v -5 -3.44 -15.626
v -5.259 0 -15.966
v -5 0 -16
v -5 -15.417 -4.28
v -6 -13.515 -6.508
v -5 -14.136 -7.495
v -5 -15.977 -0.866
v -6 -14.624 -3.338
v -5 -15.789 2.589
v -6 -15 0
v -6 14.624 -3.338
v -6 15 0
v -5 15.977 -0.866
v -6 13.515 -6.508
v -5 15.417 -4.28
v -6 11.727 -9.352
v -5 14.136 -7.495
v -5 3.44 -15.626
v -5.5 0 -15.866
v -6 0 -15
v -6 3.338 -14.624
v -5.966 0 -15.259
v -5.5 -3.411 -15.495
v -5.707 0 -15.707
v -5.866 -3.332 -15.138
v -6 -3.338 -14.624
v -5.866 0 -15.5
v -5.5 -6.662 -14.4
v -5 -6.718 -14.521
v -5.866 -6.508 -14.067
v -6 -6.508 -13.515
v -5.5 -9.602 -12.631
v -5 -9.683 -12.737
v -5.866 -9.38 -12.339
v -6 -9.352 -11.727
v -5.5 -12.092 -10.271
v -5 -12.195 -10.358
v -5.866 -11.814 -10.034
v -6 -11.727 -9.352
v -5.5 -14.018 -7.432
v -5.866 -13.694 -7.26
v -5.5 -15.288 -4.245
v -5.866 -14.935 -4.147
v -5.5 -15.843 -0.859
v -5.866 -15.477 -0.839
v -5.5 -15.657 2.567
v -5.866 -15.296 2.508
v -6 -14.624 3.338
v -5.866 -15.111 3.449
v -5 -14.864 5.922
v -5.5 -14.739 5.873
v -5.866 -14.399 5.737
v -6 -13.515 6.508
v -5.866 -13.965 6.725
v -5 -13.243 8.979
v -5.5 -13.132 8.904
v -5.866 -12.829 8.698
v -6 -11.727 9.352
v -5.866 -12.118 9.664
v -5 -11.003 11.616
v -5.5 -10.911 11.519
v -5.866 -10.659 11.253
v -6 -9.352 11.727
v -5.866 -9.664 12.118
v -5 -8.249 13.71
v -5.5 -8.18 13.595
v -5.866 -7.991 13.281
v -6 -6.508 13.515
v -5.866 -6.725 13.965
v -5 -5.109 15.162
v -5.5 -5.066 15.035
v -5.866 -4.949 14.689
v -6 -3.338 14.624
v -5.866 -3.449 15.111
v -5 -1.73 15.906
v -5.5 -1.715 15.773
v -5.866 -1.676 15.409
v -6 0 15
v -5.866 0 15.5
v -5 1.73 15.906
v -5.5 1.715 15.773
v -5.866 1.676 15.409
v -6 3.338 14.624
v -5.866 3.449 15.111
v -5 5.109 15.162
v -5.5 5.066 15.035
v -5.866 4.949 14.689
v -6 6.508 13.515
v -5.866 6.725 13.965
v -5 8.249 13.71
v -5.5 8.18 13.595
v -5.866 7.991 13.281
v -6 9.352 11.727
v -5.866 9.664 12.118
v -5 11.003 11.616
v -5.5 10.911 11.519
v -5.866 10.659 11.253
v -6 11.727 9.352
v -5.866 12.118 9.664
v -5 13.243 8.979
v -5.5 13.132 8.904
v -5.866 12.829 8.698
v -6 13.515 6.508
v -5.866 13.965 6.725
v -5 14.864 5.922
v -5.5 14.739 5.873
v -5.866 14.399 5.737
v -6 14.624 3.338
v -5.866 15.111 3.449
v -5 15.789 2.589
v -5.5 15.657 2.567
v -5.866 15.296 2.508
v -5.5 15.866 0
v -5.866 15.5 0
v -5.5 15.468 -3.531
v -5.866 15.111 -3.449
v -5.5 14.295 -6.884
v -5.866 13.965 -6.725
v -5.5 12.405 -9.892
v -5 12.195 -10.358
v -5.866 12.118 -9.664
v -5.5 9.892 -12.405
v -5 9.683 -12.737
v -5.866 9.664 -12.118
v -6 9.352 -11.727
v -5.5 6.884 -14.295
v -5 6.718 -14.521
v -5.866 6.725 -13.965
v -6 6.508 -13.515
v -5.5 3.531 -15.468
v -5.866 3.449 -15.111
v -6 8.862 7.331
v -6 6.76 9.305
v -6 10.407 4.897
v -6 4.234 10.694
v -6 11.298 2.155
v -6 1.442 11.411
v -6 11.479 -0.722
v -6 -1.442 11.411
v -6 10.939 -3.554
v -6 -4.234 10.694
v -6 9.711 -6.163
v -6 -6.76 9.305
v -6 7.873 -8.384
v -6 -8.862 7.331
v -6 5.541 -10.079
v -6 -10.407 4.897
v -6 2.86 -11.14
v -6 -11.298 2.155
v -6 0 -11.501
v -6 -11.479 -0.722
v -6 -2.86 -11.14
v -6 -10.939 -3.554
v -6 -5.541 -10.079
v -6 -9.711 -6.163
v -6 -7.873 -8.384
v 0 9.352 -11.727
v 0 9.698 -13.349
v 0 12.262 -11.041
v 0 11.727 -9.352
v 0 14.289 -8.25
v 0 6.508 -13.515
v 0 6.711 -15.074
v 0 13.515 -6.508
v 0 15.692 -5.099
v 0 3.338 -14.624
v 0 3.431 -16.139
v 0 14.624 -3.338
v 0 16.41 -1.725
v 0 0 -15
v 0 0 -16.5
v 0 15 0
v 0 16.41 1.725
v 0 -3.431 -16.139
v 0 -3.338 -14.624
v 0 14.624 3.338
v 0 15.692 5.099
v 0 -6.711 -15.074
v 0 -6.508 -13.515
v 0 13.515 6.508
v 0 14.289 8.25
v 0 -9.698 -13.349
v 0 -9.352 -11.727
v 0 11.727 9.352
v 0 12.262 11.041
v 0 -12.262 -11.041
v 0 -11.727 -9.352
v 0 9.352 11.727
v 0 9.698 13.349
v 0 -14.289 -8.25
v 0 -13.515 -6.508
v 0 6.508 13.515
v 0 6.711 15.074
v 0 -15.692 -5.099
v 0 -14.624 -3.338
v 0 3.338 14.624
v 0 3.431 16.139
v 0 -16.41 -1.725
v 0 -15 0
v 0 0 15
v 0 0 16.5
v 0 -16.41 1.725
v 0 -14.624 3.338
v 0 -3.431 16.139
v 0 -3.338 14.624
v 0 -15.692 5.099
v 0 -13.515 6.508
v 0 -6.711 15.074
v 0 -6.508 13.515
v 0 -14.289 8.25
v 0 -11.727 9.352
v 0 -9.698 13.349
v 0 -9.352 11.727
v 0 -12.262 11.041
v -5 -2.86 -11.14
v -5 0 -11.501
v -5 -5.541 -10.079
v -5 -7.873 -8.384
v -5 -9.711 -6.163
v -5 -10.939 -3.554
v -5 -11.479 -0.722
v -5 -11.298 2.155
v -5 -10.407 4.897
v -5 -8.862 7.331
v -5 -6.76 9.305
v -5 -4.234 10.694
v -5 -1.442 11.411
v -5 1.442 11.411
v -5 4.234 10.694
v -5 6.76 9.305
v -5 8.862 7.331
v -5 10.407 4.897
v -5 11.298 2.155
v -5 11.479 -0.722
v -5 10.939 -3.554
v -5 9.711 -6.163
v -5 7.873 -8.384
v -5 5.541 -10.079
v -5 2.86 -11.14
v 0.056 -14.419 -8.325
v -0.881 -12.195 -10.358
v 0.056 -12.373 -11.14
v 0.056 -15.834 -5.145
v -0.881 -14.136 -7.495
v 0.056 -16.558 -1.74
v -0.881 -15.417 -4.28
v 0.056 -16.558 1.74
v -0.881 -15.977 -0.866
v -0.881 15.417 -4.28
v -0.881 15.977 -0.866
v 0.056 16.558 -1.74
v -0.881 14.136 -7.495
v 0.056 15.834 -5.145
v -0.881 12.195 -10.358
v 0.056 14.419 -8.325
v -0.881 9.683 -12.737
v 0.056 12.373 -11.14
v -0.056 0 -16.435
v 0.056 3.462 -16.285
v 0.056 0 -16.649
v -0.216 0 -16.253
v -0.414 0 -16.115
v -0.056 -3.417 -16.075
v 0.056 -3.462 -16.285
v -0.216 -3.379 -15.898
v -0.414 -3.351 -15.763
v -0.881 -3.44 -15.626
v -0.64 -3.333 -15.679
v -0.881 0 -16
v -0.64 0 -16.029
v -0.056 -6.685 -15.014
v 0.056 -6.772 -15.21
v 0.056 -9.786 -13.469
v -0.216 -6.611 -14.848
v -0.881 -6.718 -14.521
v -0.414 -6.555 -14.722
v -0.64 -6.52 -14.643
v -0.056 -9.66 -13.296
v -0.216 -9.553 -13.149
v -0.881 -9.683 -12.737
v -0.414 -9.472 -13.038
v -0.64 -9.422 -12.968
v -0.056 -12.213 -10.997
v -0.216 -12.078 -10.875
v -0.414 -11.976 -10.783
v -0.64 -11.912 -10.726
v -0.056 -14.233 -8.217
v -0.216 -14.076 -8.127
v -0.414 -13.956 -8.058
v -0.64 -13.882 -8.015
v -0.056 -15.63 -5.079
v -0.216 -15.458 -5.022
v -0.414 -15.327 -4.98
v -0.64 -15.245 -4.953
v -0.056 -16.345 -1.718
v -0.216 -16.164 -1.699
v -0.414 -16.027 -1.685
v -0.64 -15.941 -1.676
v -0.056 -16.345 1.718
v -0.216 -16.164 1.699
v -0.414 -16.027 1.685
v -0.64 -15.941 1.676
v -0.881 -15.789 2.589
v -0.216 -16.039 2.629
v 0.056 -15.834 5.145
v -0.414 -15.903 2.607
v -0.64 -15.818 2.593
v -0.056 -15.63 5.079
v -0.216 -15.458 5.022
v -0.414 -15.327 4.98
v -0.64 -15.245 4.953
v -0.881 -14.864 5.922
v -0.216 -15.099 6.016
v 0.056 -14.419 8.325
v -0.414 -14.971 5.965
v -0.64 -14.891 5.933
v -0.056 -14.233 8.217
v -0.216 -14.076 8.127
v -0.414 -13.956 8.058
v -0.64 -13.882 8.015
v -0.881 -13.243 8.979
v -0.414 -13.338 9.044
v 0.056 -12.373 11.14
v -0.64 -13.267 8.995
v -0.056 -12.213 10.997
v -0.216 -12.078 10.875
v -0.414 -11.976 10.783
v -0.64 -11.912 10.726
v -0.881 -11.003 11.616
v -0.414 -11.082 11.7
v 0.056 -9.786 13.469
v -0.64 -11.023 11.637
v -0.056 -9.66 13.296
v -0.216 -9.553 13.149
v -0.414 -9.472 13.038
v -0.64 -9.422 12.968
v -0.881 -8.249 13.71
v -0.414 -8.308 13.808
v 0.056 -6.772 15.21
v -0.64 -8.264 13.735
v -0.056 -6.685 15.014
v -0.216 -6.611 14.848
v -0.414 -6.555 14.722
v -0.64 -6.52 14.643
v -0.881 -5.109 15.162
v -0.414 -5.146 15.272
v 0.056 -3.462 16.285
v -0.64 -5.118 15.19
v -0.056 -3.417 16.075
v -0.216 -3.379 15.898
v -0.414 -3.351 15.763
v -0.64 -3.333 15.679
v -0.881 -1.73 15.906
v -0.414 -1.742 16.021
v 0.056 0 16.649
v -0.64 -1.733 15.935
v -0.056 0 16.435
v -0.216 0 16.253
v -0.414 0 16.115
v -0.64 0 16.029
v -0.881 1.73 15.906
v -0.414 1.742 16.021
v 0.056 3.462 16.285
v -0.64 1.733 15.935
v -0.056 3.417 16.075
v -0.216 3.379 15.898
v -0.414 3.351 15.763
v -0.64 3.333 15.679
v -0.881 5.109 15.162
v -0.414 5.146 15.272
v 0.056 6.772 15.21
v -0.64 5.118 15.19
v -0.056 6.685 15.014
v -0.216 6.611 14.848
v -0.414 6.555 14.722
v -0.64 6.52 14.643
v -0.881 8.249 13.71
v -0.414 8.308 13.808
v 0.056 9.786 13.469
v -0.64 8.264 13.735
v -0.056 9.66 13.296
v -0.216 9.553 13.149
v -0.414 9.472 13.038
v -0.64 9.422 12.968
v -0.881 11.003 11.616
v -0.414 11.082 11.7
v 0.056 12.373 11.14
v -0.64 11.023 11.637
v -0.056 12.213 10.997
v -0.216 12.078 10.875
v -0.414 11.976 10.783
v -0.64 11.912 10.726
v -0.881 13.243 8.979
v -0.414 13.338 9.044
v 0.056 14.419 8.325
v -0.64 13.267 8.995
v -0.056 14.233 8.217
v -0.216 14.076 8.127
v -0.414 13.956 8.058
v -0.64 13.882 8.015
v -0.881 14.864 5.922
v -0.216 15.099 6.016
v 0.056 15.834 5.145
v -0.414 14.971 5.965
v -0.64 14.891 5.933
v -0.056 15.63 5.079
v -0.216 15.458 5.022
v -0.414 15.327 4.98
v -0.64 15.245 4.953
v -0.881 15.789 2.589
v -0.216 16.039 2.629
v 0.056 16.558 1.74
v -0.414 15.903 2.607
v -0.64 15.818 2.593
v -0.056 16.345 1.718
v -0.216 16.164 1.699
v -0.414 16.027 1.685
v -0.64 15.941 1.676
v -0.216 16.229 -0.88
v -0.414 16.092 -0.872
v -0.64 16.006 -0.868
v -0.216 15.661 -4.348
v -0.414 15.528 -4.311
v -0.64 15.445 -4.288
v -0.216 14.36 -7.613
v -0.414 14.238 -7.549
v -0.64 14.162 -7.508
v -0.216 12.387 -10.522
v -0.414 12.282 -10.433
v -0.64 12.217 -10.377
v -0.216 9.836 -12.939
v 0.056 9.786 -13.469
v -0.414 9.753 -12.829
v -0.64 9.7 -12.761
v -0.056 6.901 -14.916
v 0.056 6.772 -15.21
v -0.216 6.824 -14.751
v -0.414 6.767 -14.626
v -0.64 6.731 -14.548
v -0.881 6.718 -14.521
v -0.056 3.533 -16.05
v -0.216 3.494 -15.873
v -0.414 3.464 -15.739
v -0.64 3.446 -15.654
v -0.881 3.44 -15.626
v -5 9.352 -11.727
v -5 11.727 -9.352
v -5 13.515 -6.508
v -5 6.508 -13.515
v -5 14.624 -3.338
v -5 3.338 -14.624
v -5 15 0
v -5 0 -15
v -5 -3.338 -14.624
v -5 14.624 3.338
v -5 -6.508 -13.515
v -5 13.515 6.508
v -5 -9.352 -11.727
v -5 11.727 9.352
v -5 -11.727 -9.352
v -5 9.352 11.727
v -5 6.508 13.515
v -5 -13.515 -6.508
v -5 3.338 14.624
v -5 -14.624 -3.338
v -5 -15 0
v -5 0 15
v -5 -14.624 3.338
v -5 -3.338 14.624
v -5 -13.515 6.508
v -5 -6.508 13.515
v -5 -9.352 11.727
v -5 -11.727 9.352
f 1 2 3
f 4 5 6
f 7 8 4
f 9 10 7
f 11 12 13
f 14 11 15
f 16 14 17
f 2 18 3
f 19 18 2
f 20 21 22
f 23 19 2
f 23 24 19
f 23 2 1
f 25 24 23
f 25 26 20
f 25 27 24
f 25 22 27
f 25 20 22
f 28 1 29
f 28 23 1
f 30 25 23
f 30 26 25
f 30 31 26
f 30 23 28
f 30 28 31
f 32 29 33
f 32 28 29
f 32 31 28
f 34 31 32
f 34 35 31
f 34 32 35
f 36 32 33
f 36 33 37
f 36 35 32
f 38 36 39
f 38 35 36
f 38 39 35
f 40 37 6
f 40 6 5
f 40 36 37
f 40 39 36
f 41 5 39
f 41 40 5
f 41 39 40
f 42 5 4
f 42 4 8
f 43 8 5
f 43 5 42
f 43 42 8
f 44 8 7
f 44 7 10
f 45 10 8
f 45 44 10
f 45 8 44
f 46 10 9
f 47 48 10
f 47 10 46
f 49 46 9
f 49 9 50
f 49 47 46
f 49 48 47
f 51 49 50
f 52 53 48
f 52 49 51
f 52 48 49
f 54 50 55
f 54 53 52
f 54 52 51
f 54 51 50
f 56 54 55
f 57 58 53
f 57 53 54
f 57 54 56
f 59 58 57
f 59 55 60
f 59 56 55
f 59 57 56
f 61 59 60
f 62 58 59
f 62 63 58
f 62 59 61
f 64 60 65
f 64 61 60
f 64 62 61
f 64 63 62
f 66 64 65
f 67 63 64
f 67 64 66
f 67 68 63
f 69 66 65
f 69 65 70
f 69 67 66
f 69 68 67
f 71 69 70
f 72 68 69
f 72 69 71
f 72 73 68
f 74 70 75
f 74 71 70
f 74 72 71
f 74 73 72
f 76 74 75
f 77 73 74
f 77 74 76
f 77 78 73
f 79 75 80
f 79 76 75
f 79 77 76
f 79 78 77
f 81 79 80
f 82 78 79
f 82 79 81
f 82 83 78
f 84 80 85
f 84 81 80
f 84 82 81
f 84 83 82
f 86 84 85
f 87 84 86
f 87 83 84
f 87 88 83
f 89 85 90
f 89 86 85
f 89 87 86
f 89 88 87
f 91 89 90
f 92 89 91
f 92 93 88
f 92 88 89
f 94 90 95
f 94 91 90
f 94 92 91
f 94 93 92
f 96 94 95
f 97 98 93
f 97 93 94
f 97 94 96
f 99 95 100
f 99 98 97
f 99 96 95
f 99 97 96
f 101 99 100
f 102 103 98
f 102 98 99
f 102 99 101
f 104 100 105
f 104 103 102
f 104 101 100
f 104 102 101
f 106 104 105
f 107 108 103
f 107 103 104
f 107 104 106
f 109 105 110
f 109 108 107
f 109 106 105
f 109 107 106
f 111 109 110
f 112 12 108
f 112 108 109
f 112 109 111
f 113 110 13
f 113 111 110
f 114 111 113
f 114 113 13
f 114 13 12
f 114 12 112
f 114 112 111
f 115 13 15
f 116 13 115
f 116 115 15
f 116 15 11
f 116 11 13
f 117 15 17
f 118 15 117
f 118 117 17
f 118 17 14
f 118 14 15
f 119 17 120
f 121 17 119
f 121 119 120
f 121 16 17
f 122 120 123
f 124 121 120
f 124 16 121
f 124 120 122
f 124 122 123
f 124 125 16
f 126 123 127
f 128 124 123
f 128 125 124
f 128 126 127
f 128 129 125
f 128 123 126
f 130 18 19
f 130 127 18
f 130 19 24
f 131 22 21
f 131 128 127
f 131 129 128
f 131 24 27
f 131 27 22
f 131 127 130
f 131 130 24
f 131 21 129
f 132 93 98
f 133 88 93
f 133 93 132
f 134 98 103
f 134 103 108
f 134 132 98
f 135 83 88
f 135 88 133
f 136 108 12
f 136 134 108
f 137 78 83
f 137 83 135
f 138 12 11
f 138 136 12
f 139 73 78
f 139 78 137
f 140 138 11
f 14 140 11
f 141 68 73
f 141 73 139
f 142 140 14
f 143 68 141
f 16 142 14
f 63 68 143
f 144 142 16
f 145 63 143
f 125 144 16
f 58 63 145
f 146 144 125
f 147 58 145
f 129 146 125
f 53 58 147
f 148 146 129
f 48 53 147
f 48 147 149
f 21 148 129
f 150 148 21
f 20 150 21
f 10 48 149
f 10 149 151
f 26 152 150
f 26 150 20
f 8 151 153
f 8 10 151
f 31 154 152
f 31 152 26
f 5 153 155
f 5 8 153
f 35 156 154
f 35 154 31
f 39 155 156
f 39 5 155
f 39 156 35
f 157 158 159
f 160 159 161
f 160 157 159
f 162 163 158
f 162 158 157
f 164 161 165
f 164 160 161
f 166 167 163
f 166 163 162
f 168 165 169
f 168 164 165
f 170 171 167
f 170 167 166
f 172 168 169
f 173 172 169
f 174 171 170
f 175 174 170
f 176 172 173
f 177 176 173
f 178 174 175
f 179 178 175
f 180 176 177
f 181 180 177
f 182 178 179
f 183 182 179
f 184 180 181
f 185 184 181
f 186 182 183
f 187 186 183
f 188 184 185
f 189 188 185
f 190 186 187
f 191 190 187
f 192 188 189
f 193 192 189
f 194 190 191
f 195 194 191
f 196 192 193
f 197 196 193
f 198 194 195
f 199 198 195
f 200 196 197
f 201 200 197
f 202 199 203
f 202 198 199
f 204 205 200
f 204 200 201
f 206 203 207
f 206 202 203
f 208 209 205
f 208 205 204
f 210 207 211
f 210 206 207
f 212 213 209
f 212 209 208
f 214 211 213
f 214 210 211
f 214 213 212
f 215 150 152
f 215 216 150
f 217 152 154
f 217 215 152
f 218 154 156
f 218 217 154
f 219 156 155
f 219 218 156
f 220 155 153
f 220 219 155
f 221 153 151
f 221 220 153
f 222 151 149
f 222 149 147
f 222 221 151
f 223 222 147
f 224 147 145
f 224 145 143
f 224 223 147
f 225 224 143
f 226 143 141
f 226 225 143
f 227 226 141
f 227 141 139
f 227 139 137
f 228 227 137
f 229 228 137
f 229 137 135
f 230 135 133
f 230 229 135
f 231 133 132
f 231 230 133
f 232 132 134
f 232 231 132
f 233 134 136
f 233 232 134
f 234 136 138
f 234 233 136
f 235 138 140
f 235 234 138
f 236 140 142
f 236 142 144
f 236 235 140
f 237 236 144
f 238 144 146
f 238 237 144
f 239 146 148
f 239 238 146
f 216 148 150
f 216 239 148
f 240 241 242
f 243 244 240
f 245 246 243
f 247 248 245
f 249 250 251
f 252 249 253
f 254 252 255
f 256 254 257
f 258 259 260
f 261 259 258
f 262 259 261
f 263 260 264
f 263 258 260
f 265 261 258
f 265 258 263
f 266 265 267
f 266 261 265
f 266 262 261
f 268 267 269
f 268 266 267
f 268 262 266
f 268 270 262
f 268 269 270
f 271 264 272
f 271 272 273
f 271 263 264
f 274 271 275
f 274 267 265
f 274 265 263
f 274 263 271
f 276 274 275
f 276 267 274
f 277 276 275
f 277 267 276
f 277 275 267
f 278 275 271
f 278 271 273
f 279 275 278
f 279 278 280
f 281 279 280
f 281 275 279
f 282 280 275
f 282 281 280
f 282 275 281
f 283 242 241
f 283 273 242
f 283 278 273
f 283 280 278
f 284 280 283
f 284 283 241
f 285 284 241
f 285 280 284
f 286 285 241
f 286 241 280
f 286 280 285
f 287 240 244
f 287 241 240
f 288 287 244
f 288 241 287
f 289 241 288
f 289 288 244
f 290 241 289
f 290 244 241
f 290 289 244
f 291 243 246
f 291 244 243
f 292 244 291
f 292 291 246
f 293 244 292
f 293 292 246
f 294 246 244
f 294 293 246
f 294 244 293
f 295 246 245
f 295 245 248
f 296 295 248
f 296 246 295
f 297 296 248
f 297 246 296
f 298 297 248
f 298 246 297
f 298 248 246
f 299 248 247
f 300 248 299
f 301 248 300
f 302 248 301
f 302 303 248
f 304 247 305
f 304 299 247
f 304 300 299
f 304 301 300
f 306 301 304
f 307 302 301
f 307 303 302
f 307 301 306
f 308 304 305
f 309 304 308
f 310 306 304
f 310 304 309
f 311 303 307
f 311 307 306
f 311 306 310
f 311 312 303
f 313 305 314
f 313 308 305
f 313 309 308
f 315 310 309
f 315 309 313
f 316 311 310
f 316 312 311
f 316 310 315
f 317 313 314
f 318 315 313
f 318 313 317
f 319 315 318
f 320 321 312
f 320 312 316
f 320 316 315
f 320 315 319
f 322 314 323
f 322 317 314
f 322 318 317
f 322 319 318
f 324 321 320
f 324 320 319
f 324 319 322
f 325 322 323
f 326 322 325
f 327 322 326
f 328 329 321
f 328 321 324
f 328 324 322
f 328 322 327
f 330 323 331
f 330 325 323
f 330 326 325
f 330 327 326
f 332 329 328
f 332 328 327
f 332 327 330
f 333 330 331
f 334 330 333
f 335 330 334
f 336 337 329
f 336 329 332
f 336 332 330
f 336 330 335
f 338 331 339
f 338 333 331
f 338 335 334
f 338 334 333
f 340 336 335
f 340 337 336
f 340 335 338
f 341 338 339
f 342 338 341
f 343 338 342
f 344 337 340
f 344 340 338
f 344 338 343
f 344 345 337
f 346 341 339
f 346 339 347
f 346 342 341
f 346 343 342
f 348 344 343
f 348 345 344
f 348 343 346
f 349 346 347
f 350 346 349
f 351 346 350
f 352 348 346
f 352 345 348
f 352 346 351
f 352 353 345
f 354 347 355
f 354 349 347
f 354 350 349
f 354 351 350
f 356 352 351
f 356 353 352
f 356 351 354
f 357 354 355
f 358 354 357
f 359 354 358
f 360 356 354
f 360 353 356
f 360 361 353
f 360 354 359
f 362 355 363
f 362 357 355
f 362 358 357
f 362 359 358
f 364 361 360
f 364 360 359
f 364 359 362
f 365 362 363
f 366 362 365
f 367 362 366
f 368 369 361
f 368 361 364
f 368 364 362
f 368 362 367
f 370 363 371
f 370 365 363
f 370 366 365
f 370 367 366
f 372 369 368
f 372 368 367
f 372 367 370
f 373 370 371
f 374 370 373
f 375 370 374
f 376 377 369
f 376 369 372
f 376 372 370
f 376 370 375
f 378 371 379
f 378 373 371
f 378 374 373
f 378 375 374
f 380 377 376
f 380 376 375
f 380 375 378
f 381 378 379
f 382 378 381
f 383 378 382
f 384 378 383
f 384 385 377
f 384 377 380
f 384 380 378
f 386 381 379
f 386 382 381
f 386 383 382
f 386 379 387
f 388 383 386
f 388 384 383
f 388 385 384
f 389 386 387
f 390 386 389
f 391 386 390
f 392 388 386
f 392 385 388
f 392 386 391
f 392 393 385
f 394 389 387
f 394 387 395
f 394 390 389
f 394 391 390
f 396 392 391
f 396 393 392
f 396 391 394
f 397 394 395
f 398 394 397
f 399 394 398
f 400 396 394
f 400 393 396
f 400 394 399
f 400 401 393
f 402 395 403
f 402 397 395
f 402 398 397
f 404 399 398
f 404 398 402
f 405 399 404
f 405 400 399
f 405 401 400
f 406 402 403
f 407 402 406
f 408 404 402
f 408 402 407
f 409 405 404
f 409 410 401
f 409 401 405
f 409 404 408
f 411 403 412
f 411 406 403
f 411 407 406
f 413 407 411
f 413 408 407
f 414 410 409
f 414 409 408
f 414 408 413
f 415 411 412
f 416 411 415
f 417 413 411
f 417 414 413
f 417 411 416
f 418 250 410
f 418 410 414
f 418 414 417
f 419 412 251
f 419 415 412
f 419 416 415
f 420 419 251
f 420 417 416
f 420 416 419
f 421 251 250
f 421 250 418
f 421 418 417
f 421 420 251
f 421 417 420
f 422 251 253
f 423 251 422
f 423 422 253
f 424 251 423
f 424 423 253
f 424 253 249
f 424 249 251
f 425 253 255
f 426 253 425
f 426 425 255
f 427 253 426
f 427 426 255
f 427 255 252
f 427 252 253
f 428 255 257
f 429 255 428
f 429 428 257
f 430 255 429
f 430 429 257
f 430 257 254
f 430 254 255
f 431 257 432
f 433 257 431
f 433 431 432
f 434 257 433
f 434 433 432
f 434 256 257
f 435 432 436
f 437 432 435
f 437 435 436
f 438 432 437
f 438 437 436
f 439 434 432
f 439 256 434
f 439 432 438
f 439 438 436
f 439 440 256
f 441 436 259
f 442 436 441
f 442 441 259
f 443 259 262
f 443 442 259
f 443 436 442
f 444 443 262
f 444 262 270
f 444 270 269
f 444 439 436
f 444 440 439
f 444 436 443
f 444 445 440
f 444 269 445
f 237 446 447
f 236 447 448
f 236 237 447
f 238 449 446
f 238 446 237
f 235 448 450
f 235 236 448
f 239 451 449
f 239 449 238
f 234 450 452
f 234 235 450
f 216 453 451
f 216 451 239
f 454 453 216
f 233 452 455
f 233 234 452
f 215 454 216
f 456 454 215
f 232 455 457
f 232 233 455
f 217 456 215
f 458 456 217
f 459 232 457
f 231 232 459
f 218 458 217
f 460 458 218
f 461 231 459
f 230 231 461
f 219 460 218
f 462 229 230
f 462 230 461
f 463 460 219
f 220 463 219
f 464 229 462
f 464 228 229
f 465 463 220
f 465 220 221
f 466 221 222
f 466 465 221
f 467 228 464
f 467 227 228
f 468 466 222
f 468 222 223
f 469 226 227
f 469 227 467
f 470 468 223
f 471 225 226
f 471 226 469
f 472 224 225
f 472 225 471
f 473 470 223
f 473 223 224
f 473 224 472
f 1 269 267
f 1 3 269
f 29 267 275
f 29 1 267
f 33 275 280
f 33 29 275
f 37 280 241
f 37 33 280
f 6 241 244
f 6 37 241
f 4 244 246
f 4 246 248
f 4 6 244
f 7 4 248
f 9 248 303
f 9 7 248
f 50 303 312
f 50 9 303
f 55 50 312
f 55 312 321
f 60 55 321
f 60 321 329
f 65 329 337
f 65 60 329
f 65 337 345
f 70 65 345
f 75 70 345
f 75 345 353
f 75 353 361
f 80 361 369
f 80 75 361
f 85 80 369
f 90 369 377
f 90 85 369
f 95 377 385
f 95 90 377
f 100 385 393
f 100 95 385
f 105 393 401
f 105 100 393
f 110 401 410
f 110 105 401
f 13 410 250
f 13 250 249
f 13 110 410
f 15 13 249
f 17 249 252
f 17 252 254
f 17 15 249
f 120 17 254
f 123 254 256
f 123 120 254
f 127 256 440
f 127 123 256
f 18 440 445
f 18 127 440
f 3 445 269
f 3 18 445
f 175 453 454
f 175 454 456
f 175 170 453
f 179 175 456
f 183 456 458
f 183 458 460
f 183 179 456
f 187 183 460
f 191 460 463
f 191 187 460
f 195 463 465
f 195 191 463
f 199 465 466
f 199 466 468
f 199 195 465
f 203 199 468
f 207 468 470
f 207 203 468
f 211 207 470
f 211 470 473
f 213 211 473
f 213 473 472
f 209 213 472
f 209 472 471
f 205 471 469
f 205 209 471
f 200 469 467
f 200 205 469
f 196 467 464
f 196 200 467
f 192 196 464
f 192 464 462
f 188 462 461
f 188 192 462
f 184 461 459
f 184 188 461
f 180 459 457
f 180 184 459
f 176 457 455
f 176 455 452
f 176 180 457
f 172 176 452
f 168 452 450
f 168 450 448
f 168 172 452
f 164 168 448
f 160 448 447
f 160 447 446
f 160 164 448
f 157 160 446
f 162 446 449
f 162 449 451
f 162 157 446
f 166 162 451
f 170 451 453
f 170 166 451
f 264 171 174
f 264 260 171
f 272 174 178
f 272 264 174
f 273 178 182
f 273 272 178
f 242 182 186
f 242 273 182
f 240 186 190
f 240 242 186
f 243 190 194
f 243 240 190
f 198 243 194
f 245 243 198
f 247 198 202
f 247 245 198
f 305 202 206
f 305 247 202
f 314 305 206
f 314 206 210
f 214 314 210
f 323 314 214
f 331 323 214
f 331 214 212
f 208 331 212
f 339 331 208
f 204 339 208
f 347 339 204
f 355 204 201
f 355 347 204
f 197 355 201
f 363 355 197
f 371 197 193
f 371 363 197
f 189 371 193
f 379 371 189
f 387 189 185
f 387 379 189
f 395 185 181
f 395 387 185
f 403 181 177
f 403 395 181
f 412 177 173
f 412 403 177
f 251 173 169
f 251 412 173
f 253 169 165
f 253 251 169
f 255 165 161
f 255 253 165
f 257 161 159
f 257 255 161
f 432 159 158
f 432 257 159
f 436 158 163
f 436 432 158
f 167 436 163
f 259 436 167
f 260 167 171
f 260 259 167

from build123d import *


with BuildPart() as part:
    # Croquis1 → Revolución1 (revolve)
    with BuildSketch(Plane(origin=(0, 0, 0), x_dir=(1, 0, 0), z_dir=(0, 1, 0))):
        with BuildLine():
            Line((-0.88053939, 16), (-5, 16))
            ThreePointArc((-5, 16), (-5.707106781, 15.707106781), (-6, 15))
            Line((-6, 15), (-6, 11.50146596))
            Line((-6, 11.50146596), (-5, 11.50146596))
            Line((-5, 11.50146596), (-5, 15))
            Line((-5, 15), (0, 15))
            Line((0, 15), (0, 16.5))
            Line((0, 16.5), (0.055870191, 16.649091044))
            ThreePointArc((0.055870191, 16.649091044), (-0.310850421, 16.178139624), (-0.88053939, 16))
        make_face()
    revolve(axis=Axis((0, 0, 0), (-1, 0, 0)))


solid = part.part
